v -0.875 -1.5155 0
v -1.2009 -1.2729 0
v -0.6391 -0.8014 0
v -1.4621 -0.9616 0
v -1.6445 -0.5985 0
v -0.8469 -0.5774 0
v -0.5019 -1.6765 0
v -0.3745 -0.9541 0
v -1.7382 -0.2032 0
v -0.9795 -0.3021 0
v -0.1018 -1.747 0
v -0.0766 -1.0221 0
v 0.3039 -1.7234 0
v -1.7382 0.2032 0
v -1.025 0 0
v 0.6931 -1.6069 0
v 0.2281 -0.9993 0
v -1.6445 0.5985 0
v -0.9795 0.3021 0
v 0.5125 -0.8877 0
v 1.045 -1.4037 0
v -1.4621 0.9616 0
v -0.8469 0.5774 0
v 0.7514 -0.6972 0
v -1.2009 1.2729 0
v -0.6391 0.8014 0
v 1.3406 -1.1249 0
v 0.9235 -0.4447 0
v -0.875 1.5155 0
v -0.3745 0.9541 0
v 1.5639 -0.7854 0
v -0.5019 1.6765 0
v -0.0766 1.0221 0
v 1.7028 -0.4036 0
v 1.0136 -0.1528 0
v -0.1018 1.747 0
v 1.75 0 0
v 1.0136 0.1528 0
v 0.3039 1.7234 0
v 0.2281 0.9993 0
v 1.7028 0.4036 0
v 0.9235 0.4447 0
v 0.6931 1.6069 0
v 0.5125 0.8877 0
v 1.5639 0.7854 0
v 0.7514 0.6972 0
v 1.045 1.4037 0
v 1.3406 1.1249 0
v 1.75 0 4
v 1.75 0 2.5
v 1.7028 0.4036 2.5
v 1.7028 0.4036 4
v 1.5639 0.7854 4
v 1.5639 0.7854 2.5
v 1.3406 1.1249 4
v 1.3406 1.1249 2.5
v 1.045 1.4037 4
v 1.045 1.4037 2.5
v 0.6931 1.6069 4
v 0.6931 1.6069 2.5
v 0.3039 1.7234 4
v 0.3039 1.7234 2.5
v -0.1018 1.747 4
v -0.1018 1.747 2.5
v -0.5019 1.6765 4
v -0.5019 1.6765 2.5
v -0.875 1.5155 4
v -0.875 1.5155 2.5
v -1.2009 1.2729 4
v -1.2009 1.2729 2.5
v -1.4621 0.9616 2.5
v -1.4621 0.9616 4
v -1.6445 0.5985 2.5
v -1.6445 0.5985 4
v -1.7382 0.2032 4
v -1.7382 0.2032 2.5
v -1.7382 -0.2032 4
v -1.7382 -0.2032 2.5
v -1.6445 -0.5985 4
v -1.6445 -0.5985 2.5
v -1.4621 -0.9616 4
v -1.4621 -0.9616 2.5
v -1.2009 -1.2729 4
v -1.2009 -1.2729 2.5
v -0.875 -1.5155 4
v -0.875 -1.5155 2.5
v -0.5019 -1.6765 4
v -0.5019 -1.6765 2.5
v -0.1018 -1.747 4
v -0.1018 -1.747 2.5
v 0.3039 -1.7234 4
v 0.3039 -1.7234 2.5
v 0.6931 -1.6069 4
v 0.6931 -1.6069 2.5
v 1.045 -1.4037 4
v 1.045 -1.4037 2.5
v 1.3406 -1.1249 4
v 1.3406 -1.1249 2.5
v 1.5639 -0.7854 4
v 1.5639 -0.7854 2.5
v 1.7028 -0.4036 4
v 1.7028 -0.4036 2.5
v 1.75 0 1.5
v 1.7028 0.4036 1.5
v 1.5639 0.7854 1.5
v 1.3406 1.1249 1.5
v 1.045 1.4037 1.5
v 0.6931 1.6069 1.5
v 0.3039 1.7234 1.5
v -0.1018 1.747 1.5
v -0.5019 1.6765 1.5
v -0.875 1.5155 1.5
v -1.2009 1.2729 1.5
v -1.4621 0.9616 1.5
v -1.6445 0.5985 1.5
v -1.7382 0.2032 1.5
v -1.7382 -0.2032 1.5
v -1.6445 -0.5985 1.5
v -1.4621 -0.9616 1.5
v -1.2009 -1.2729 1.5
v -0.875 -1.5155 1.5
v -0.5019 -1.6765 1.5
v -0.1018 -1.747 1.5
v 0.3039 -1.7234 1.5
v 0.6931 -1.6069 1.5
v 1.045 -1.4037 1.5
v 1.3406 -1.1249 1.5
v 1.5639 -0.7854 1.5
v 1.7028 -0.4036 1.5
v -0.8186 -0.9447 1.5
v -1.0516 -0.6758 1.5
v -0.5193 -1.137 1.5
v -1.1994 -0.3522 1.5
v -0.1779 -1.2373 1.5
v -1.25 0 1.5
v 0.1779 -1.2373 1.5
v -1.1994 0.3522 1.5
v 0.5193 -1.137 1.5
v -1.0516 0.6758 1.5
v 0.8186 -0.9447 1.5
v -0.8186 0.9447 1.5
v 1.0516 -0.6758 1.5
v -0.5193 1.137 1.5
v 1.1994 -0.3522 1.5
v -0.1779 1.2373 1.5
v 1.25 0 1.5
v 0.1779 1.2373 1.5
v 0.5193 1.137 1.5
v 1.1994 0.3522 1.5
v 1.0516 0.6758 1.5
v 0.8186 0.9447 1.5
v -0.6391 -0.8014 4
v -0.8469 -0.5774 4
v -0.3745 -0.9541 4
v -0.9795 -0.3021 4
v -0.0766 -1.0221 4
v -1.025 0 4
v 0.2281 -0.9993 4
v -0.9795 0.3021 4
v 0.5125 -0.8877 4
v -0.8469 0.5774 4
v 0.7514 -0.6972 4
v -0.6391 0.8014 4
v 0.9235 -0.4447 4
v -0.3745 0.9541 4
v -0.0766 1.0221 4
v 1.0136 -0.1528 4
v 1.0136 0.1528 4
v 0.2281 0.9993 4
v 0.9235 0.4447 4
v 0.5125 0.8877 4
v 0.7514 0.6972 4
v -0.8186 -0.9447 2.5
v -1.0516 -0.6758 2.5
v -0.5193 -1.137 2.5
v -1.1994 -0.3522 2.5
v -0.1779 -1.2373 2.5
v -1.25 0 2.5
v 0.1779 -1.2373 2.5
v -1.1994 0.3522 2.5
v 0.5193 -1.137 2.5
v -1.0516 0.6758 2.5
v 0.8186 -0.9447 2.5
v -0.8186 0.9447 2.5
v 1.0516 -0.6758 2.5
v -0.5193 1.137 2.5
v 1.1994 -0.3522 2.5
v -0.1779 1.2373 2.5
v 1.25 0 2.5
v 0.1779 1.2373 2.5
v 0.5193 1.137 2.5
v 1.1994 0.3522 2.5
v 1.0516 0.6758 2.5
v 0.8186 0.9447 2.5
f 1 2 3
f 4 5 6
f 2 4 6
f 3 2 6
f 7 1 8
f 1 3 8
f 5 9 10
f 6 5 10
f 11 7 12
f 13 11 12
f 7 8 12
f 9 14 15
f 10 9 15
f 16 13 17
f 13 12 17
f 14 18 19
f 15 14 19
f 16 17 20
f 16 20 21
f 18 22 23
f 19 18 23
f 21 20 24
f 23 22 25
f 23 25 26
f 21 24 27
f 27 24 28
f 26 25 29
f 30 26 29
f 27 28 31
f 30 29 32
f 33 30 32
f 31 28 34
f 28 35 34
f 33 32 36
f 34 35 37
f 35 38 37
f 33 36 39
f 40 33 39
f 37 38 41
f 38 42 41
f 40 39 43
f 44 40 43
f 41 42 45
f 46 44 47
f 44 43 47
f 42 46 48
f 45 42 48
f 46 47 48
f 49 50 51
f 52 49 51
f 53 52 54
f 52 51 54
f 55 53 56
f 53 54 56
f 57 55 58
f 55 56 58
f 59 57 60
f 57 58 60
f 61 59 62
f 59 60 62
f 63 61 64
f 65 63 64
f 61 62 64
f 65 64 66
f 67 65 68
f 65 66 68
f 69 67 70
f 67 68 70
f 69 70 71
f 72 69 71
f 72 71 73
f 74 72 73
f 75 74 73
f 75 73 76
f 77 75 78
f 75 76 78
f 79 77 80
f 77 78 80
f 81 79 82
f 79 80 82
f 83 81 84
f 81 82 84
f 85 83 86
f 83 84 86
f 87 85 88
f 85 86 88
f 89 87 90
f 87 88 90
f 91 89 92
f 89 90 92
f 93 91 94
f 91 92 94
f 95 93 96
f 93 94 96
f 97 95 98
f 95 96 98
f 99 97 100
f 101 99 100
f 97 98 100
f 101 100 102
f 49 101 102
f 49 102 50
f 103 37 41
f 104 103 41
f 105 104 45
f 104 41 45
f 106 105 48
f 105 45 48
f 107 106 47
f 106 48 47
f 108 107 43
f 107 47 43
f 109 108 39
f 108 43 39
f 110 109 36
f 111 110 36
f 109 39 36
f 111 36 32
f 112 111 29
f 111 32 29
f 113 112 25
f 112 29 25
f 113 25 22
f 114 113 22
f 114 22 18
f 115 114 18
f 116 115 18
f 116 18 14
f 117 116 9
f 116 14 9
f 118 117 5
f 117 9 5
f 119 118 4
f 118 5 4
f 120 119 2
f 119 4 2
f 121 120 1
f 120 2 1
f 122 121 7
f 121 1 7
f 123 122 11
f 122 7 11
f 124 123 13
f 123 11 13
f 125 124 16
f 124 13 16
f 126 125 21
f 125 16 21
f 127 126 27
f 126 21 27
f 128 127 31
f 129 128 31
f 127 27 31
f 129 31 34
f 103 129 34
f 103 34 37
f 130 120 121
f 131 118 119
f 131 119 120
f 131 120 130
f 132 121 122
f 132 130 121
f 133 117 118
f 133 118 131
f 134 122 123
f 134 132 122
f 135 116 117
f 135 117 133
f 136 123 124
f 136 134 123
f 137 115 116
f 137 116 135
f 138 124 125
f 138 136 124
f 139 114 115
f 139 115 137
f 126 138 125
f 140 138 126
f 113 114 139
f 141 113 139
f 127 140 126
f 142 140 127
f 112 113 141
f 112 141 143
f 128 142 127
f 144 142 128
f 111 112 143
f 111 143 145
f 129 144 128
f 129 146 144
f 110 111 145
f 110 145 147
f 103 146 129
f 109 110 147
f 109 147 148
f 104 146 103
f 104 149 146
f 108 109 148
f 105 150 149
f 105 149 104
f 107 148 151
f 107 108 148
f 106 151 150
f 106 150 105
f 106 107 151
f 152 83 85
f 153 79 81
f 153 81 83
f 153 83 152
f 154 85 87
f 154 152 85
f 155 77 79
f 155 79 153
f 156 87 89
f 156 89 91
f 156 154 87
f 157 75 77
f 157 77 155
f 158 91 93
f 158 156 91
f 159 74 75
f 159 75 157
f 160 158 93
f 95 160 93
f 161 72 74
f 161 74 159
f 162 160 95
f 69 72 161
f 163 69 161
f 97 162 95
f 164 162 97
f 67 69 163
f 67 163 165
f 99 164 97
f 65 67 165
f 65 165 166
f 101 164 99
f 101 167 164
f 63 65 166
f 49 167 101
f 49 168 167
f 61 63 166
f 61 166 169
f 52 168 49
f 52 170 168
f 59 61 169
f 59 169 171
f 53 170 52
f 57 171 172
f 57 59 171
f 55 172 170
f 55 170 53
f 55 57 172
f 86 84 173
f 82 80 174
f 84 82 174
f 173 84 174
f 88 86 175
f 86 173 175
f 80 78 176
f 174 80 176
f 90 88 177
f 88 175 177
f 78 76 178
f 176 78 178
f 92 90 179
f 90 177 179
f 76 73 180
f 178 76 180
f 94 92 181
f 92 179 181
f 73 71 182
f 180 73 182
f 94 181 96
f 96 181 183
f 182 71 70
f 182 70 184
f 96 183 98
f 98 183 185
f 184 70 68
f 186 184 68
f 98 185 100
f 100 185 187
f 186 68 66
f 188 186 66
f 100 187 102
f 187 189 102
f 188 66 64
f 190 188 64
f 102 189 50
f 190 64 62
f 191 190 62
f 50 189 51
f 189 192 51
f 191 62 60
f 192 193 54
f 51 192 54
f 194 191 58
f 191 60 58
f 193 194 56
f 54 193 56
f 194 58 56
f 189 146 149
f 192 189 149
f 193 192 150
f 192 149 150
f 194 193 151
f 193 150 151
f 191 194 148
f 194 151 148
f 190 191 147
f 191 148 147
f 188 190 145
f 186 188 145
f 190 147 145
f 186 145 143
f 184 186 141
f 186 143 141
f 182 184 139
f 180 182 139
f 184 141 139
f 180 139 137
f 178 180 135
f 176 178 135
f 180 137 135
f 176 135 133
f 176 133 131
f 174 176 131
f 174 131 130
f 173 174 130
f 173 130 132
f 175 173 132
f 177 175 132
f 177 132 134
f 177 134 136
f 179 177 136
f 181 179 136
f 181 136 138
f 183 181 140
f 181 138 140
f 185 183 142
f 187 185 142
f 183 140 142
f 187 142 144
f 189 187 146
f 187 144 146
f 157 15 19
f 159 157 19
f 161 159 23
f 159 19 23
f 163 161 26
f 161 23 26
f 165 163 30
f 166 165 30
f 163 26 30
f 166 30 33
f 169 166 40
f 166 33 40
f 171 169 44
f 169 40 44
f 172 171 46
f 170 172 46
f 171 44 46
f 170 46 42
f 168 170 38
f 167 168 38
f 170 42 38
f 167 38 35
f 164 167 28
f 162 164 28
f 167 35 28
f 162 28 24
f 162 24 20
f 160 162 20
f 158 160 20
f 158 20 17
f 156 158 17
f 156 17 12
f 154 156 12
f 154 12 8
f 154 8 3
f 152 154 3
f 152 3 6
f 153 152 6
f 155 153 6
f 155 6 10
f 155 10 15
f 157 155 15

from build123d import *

# Parameters (mm, degrees)
SKETCH_1_R           = 1.75
EXTRUDE_1_DEPTH      = 1.5
SKETCH_2_R           = 1.25
EXTRUDE_2_DEPTH      = 1
SKETCH_3_R           = 1.75
EXTRUDE_3_DEPTH      = 1.5
HOLE_WIZARD_M2_5_1_D = 2.05


with BuildPart() as part:
    # 草图1 → 凸台-拉伸1 (new body)
    with BuildSketch(Plane.XY):
        Circle(SKETCH_1_R)
    extrude(amount=EXTRUDE_1_DEPTH)

    # 草图2 → 凸台-拉伸2 (add)
    with BuildSketch(Plane.XY.offset(1.5)):
        Circle(SKETCH_2_R)
    extrude(amount=EXTRUDE_2_DEPTH)

    # 草图3 → 凸台-拉伸3 (add)
    with BuildSketch(Plane.XY.offset(2.5)):
        Circle(SKETCH_3_R)
    extrude(amount=EXTRUDE_3_DEPTH)

    # M2.5 螺纹孔1 (through all)
    with Locations(Plane.XY.offset(4)):
        with Locations((0, 0)):
            Hole(HOLE_WIZARD_M2_5_1_D / 2)


solid = part.part
